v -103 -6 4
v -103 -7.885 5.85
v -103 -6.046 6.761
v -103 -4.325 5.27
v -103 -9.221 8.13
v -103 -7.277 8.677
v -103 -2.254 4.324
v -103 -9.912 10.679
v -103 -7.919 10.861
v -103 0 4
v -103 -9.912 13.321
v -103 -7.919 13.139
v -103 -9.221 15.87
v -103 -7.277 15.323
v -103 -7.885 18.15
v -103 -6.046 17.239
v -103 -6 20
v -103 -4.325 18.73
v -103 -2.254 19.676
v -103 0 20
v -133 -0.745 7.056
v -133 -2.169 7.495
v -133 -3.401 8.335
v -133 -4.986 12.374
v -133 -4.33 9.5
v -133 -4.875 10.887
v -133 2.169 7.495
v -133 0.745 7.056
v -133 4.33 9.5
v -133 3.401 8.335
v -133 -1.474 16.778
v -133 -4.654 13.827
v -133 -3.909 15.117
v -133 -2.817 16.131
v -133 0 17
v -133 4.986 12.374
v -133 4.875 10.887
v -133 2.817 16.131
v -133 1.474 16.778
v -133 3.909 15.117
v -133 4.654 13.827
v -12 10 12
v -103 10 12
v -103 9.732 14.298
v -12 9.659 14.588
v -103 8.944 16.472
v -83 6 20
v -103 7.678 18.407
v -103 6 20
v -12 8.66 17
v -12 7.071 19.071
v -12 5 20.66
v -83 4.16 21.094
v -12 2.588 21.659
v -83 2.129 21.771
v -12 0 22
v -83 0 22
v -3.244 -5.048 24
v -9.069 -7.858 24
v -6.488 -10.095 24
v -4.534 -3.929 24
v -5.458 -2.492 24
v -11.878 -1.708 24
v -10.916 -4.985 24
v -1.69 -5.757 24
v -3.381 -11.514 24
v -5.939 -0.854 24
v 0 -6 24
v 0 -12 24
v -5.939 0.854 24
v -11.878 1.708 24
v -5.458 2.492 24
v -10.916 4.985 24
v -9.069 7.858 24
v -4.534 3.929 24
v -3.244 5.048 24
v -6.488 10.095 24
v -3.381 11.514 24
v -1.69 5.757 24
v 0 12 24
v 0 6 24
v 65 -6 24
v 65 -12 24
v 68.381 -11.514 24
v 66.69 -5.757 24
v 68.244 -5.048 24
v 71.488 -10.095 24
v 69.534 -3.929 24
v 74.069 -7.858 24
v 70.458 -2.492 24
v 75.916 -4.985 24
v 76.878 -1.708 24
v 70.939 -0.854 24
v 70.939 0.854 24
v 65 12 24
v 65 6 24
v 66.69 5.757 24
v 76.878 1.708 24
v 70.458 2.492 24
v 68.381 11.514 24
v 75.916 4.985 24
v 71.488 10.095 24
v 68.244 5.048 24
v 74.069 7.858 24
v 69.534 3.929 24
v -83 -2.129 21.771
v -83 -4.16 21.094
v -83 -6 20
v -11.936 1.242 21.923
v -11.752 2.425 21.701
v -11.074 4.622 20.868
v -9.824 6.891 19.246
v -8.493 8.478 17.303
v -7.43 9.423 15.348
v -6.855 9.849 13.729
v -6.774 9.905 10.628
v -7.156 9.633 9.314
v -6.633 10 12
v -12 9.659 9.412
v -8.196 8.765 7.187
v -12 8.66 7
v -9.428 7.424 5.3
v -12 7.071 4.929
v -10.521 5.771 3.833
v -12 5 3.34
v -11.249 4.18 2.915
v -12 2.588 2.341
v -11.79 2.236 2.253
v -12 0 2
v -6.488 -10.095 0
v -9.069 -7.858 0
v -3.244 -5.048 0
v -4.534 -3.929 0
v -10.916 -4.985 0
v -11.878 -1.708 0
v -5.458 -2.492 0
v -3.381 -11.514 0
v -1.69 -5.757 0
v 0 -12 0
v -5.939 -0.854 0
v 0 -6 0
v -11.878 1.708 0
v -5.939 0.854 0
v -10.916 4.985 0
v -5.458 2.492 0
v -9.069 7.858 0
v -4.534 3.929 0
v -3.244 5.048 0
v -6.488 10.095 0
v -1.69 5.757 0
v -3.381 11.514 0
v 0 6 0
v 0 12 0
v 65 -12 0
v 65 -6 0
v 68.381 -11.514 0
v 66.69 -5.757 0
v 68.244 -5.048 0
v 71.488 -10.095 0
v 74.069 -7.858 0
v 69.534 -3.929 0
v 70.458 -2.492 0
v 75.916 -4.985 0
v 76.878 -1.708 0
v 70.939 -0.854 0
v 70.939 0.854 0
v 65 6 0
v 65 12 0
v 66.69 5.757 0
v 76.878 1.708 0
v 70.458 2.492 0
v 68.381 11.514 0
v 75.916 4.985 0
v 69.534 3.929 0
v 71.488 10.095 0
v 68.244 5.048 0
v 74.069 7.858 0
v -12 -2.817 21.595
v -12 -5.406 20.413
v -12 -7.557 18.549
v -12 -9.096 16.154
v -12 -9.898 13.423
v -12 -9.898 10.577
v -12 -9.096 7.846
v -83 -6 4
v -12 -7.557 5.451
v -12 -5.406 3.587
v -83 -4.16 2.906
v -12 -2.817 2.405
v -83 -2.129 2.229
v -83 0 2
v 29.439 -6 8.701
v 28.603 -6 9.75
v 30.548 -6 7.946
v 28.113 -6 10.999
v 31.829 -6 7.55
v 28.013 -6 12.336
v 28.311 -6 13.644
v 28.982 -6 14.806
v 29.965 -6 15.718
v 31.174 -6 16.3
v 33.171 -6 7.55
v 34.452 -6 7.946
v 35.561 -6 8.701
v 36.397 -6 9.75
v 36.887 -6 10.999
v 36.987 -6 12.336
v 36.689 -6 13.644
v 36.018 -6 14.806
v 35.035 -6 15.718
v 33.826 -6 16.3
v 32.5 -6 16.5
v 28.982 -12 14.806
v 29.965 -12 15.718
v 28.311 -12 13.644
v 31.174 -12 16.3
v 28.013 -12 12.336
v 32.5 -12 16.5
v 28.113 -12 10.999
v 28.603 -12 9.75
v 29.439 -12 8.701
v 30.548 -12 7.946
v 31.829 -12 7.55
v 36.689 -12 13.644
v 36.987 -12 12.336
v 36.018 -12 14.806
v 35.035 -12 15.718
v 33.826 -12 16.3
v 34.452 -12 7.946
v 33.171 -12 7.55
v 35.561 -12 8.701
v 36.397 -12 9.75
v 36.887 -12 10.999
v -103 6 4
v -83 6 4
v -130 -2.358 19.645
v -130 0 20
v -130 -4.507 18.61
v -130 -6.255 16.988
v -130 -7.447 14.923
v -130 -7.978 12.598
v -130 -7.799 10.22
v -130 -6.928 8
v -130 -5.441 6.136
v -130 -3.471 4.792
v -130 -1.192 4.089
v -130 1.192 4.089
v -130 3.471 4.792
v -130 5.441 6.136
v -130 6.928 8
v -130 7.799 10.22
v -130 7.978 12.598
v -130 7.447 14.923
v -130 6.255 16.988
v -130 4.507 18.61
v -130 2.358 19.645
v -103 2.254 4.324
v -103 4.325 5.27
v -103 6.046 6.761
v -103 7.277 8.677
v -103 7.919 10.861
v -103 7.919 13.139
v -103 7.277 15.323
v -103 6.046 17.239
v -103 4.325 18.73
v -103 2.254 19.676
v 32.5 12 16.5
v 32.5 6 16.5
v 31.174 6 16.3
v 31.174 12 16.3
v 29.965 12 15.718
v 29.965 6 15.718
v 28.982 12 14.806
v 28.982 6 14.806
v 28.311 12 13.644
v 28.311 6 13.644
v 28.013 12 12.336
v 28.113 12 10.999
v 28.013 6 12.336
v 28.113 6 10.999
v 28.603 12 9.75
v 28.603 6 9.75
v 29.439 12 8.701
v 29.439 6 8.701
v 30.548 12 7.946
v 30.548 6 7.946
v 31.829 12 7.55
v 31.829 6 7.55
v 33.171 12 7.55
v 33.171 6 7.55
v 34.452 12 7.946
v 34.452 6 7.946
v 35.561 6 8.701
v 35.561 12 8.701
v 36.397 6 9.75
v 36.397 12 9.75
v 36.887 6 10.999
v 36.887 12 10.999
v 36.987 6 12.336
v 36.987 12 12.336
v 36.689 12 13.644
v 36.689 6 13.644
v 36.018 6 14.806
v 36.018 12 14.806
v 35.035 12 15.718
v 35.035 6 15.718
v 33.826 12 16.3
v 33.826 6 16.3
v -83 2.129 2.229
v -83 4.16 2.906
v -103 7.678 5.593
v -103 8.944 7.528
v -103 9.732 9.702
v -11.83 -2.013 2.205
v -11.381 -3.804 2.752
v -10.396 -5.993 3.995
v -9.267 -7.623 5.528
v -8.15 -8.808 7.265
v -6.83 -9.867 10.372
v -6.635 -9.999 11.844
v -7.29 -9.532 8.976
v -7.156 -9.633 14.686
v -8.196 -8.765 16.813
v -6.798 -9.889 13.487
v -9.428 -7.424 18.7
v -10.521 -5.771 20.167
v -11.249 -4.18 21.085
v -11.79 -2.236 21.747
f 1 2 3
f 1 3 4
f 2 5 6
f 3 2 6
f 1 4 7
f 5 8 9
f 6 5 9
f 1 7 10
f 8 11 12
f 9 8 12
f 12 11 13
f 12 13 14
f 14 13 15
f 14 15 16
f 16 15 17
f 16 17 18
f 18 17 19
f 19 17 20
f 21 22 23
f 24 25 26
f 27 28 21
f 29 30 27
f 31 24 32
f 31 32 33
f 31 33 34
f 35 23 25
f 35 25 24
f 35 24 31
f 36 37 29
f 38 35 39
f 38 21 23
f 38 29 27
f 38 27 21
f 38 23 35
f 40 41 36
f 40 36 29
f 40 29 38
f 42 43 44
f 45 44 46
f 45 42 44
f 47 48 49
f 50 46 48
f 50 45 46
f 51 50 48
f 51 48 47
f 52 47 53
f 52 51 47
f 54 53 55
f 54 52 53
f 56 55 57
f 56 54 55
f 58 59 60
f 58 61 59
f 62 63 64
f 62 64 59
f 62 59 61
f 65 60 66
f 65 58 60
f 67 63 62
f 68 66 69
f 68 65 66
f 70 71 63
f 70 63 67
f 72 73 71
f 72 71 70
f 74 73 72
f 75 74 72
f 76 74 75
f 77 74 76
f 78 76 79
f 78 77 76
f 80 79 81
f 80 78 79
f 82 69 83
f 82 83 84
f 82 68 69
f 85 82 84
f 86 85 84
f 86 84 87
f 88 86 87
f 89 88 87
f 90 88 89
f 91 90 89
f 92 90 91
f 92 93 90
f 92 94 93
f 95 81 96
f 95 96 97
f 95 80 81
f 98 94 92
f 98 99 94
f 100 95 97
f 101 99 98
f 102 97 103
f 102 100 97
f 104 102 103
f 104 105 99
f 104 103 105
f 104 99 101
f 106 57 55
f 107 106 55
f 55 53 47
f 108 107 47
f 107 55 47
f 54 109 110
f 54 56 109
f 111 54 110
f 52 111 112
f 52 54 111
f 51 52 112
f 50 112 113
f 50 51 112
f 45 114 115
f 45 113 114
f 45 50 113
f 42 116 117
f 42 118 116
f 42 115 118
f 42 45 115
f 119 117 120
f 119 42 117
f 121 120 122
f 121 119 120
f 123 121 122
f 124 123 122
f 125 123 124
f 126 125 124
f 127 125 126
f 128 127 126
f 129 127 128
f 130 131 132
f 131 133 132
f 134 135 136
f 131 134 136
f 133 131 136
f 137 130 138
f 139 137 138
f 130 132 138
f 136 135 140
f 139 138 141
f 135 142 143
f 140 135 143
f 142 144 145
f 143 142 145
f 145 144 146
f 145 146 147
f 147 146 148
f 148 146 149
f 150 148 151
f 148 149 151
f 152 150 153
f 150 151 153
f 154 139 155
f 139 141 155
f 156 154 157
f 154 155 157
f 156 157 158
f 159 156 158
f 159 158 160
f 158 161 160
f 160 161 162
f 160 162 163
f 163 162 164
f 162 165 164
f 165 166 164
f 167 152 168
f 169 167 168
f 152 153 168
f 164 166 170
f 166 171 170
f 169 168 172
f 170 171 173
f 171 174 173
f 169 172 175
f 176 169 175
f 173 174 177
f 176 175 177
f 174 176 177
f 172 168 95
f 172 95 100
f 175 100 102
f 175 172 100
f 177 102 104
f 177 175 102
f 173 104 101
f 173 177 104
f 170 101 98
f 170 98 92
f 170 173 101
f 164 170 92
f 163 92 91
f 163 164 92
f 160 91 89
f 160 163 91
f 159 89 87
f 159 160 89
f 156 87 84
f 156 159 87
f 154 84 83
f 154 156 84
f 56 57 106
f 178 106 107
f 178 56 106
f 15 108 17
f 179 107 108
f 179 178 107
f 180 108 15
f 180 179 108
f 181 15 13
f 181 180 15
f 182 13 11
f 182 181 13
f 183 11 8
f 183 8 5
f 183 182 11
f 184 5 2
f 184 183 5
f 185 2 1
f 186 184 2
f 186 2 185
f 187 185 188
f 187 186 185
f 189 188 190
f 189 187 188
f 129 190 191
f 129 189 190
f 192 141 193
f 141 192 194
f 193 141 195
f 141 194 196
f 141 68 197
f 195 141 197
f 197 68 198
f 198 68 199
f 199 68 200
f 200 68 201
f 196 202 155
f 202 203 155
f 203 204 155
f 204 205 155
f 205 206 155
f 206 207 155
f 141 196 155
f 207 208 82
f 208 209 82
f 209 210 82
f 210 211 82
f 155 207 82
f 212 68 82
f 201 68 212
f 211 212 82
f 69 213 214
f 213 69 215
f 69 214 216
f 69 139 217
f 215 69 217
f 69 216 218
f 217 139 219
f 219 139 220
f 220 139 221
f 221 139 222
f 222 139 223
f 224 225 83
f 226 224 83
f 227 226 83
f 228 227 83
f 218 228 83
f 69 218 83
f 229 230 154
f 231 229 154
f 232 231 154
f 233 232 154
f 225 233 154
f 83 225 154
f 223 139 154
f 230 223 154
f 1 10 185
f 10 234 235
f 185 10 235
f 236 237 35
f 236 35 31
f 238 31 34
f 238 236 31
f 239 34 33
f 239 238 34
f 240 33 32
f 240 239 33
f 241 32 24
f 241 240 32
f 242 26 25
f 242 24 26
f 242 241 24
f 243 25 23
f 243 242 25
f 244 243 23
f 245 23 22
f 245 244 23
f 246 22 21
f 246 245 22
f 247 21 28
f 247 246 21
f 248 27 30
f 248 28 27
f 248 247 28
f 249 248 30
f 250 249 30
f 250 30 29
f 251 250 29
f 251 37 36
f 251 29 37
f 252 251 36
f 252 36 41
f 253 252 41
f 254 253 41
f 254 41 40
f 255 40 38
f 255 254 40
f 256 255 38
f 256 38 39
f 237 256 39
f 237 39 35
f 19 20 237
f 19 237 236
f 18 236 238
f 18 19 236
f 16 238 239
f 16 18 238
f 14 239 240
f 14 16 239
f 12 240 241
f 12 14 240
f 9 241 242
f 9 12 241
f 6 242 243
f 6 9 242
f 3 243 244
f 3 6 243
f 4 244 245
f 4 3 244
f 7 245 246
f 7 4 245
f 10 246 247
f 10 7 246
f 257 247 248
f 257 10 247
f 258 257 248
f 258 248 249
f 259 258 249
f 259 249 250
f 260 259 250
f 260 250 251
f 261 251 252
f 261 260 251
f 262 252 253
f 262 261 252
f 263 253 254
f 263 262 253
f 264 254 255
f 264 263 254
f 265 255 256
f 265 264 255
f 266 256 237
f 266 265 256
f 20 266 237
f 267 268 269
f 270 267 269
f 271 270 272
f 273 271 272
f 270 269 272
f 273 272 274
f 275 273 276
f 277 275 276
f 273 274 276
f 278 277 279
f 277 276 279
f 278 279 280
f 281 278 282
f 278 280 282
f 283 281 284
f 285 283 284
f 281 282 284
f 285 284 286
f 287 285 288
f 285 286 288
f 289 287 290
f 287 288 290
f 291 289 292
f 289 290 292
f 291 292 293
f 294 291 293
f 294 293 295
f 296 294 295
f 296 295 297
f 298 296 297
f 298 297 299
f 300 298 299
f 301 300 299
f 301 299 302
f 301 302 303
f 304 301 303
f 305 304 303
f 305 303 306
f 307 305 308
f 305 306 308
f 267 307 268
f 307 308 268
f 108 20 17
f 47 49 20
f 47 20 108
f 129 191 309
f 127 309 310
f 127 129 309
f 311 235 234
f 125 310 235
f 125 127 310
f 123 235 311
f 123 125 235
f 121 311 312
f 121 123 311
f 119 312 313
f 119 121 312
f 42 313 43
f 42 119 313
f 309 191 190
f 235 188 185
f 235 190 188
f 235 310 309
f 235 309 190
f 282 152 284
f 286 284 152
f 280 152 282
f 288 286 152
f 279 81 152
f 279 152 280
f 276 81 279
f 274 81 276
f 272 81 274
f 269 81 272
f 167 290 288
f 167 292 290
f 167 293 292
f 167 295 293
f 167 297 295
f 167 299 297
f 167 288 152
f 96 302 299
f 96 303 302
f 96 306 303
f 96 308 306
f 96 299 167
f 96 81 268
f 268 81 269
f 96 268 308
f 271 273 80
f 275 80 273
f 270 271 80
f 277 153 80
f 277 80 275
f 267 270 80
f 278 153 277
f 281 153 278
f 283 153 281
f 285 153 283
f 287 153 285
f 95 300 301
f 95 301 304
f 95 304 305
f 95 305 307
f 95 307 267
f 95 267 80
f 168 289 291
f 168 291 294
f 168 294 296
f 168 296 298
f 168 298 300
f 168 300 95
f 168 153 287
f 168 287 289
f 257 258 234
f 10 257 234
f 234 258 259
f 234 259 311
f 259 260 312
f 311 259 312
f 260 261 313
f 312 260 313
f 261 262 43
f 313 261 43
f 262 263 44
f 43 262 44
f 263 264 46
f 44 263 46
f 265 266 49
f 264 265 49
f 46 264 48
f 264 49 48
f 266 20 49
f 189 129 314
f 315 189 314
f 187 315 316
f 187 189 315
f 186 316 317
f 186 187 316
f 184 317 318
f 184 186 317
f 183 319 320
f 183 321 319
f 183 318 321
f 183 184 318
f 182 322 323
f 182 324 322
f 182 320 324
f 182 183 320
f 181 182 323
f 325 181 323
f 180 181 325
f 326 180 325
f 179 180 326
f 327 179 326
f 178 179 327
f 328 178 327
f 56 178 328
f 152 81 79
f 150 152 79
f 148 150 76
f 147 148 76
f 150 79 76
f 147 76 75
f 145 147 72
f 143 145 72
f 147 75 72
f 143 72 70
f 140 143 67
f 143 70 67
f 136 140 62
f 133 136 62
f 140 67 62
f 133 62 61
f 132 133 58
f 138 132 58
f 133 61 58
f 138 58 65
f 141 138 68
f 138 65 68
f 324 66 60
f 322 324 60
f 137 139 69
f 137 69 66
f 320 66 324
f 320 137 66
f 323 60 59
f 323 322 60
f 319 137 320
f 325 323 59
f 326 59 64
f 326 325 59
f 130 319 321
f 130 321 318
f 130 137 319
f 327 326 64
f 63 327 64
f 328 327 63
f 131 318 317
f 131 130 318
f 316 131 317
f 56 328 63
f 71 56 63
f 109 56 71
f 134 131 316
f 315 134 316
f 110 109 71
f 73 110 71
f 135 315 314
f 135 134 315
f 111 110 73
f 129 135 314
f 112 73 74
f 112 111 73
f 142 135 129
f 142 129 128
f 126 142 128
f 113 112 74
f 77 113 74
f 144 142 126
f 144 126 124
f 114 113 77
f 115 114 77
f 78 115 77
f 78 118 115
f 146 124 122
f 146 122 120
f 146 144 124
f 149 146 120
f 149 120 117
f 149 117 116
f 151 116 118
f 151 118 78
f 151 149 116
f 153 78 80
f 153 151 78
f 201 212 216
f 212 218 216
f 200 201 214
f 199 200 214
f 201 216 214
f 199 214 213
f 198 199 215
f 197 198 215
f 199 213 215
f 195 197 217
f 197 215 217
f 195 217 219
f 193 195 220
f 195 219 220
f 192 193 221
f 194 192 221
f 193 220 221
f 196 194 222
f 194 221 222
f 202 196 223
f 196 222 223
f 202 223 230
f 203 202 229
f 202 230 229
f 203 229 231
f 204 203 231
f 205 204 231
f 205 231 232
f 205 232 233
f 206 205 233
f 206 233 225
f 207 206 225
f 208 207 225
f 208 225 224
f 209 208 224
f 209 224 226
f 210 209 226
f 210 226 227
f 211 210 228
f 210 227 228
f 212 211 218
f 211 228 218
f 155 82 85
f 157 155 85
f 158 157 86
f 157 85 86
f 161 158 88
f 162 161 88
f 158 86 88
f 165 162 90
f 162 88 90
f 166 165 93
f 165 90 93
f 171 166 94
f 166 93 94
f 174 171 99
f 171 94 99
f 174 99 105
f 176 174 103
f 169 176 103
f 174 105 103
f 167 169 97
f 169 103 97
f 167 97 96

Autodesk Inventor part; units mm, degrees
sketch "Sketch1" plane through (0, 0, 0) normal (0, 0, 1) x (1, 0, 0)
  line L0 (0, 0) -> (65, 0)
  circle A0 centre (0, 0) radius 12
  circle A1 centre (65, 0) radius 12
  line L1 (0, 12) -> (65, 12)
  line L2 (0, -12) -> (65, -12)
  dimension "d0" = 65
  dimension "d1" = 24
extrude "Extrusion1" add sketch "Sketch1" along normal blind 24
sketch "Sketch2" plane through (0, 0, 24) normal (0, 0, 1) x (1, 0, 0)
  circle A0 centre (0, 0) radius 6
  arc A1 (65, -12) -> (65, 12) centre (65, 0) ccw projected
  circle A2 centre (65, 0) radius 6
  line L0 (0, 6) -> (65, 6)
  line L1 (0, -6) -> (65, -6)
  dimension "d4" = 12
extrude "Extrusion2" cut sketch "Sketch2" against normal through all
sketch "Sketch3" plane through (0, 12, 0) normal (0, 1, 0) x (1, 0, 0)
  point P0 (0, 0)
  point P1 (32.5, -12)
hole "Hole1" at (32.5, 12, 12) direction (0, -1, 0) diameter 9 end through all
ref_plane "Work Plane1" through (-12, 0, 0) normal (1, 0, 0) x (0, 1, 0)
sketch "Sketch4" plane through (-12, 0, 0) normal (1, 0, 0) x (0, 1, 0)
  circle A0 centre (0, 12) radius 10
  point P0 (0, 0)
  dimension "d14" = 20
extrude "Extrusion3" add sketch "Sketch4" along normal blind 6
sketch "Sketch5" plane through (-12, 0, 0) normal (1, 0, 0) x (0, 1, 0)
  arc A0 (0, 22) -> (0, 2) centre (0, 12) ccw projected
  circle A1 centre (0, 12) radius 10
  point P0 (0, 0)
  point P1 (0, 2)
  dimension "d17" = 20
extrude "Extrusion4" add sketch "Sketch5" against normal blind 91
sketch "Sketch6" plane through (-103, 0, 12) normal (-1, 0, 0) x (0, 0, 1)
  circle A0 centre (0, 0) radius 8
  point P0 (-12, 0)
  dimension "d20" = 16
extrude "Extrusion5" add sketch "Sketch6" along normal blind 30
chamfer "Chamfer1" distance 3 angle 45 1 edges at (-133, 0, 4) measured on face at (-133, -1.0645, 14.108)
ref_plane "Work Plane2" through (-12, 0, 22) normal (0, 0, 1) x (1, 0, 0)
sketch "Sketch7" plane through (-12, 0, 22) normal (0, 0, 1) x (1, 0, 0)
  line L0 (-91, -10) -> (5.3668, -10) projected
  line L1 (-91, 10) -> (5.3668, 10) projected
  line L2 (-91, 10) -> (-91, -10) projected
  line L3 (-91, -10) -> (-71, -10)
  line L4 (-71, -10) -> (-71, 10)
  line L5 (-71, 10) -> (-91, 10)
  line L6 (-91, 10) -> (-91, -10)
  point P0 (12, 0)
  point P1 (-71, -10)
  dimension "d26" = 20
extrude "Extrusion6" cut sketch "Sketch7" against normal blind 2
ref_plane "Work Plane3" through (-12, 0, 2) normal (0, 0, 1) x (1, 0, 0)
sketch "Sketch8" plane through (-12, 0, 2) normal (0, 0, 1) x (1, 0, 0)
  line L0 (-91, -10) -> (5.3668, -10) projected
  line L1 (-91, 10) -> (-91, -10) projected
  line L2 (-91, 10) -> (5.3668, 10) projected
  line L3 (-91, -10) -> (-71, -10)
  line L4 (-71, -10) -> (-71, 10)
  line L5 (-71, 10) -> (-91, 10)
  line L6 (-91, 10) -> (-91, -10)
  point P0 (12, 0)
  point P1 (-91, 6)
  point P2 (-91, -6)
  point P3 (-71, -10)
  dimension "d29" = 20
extrude "Extrusion7" cut sketch "Sketch8" along normal blind 2
properties part number "hf2"
